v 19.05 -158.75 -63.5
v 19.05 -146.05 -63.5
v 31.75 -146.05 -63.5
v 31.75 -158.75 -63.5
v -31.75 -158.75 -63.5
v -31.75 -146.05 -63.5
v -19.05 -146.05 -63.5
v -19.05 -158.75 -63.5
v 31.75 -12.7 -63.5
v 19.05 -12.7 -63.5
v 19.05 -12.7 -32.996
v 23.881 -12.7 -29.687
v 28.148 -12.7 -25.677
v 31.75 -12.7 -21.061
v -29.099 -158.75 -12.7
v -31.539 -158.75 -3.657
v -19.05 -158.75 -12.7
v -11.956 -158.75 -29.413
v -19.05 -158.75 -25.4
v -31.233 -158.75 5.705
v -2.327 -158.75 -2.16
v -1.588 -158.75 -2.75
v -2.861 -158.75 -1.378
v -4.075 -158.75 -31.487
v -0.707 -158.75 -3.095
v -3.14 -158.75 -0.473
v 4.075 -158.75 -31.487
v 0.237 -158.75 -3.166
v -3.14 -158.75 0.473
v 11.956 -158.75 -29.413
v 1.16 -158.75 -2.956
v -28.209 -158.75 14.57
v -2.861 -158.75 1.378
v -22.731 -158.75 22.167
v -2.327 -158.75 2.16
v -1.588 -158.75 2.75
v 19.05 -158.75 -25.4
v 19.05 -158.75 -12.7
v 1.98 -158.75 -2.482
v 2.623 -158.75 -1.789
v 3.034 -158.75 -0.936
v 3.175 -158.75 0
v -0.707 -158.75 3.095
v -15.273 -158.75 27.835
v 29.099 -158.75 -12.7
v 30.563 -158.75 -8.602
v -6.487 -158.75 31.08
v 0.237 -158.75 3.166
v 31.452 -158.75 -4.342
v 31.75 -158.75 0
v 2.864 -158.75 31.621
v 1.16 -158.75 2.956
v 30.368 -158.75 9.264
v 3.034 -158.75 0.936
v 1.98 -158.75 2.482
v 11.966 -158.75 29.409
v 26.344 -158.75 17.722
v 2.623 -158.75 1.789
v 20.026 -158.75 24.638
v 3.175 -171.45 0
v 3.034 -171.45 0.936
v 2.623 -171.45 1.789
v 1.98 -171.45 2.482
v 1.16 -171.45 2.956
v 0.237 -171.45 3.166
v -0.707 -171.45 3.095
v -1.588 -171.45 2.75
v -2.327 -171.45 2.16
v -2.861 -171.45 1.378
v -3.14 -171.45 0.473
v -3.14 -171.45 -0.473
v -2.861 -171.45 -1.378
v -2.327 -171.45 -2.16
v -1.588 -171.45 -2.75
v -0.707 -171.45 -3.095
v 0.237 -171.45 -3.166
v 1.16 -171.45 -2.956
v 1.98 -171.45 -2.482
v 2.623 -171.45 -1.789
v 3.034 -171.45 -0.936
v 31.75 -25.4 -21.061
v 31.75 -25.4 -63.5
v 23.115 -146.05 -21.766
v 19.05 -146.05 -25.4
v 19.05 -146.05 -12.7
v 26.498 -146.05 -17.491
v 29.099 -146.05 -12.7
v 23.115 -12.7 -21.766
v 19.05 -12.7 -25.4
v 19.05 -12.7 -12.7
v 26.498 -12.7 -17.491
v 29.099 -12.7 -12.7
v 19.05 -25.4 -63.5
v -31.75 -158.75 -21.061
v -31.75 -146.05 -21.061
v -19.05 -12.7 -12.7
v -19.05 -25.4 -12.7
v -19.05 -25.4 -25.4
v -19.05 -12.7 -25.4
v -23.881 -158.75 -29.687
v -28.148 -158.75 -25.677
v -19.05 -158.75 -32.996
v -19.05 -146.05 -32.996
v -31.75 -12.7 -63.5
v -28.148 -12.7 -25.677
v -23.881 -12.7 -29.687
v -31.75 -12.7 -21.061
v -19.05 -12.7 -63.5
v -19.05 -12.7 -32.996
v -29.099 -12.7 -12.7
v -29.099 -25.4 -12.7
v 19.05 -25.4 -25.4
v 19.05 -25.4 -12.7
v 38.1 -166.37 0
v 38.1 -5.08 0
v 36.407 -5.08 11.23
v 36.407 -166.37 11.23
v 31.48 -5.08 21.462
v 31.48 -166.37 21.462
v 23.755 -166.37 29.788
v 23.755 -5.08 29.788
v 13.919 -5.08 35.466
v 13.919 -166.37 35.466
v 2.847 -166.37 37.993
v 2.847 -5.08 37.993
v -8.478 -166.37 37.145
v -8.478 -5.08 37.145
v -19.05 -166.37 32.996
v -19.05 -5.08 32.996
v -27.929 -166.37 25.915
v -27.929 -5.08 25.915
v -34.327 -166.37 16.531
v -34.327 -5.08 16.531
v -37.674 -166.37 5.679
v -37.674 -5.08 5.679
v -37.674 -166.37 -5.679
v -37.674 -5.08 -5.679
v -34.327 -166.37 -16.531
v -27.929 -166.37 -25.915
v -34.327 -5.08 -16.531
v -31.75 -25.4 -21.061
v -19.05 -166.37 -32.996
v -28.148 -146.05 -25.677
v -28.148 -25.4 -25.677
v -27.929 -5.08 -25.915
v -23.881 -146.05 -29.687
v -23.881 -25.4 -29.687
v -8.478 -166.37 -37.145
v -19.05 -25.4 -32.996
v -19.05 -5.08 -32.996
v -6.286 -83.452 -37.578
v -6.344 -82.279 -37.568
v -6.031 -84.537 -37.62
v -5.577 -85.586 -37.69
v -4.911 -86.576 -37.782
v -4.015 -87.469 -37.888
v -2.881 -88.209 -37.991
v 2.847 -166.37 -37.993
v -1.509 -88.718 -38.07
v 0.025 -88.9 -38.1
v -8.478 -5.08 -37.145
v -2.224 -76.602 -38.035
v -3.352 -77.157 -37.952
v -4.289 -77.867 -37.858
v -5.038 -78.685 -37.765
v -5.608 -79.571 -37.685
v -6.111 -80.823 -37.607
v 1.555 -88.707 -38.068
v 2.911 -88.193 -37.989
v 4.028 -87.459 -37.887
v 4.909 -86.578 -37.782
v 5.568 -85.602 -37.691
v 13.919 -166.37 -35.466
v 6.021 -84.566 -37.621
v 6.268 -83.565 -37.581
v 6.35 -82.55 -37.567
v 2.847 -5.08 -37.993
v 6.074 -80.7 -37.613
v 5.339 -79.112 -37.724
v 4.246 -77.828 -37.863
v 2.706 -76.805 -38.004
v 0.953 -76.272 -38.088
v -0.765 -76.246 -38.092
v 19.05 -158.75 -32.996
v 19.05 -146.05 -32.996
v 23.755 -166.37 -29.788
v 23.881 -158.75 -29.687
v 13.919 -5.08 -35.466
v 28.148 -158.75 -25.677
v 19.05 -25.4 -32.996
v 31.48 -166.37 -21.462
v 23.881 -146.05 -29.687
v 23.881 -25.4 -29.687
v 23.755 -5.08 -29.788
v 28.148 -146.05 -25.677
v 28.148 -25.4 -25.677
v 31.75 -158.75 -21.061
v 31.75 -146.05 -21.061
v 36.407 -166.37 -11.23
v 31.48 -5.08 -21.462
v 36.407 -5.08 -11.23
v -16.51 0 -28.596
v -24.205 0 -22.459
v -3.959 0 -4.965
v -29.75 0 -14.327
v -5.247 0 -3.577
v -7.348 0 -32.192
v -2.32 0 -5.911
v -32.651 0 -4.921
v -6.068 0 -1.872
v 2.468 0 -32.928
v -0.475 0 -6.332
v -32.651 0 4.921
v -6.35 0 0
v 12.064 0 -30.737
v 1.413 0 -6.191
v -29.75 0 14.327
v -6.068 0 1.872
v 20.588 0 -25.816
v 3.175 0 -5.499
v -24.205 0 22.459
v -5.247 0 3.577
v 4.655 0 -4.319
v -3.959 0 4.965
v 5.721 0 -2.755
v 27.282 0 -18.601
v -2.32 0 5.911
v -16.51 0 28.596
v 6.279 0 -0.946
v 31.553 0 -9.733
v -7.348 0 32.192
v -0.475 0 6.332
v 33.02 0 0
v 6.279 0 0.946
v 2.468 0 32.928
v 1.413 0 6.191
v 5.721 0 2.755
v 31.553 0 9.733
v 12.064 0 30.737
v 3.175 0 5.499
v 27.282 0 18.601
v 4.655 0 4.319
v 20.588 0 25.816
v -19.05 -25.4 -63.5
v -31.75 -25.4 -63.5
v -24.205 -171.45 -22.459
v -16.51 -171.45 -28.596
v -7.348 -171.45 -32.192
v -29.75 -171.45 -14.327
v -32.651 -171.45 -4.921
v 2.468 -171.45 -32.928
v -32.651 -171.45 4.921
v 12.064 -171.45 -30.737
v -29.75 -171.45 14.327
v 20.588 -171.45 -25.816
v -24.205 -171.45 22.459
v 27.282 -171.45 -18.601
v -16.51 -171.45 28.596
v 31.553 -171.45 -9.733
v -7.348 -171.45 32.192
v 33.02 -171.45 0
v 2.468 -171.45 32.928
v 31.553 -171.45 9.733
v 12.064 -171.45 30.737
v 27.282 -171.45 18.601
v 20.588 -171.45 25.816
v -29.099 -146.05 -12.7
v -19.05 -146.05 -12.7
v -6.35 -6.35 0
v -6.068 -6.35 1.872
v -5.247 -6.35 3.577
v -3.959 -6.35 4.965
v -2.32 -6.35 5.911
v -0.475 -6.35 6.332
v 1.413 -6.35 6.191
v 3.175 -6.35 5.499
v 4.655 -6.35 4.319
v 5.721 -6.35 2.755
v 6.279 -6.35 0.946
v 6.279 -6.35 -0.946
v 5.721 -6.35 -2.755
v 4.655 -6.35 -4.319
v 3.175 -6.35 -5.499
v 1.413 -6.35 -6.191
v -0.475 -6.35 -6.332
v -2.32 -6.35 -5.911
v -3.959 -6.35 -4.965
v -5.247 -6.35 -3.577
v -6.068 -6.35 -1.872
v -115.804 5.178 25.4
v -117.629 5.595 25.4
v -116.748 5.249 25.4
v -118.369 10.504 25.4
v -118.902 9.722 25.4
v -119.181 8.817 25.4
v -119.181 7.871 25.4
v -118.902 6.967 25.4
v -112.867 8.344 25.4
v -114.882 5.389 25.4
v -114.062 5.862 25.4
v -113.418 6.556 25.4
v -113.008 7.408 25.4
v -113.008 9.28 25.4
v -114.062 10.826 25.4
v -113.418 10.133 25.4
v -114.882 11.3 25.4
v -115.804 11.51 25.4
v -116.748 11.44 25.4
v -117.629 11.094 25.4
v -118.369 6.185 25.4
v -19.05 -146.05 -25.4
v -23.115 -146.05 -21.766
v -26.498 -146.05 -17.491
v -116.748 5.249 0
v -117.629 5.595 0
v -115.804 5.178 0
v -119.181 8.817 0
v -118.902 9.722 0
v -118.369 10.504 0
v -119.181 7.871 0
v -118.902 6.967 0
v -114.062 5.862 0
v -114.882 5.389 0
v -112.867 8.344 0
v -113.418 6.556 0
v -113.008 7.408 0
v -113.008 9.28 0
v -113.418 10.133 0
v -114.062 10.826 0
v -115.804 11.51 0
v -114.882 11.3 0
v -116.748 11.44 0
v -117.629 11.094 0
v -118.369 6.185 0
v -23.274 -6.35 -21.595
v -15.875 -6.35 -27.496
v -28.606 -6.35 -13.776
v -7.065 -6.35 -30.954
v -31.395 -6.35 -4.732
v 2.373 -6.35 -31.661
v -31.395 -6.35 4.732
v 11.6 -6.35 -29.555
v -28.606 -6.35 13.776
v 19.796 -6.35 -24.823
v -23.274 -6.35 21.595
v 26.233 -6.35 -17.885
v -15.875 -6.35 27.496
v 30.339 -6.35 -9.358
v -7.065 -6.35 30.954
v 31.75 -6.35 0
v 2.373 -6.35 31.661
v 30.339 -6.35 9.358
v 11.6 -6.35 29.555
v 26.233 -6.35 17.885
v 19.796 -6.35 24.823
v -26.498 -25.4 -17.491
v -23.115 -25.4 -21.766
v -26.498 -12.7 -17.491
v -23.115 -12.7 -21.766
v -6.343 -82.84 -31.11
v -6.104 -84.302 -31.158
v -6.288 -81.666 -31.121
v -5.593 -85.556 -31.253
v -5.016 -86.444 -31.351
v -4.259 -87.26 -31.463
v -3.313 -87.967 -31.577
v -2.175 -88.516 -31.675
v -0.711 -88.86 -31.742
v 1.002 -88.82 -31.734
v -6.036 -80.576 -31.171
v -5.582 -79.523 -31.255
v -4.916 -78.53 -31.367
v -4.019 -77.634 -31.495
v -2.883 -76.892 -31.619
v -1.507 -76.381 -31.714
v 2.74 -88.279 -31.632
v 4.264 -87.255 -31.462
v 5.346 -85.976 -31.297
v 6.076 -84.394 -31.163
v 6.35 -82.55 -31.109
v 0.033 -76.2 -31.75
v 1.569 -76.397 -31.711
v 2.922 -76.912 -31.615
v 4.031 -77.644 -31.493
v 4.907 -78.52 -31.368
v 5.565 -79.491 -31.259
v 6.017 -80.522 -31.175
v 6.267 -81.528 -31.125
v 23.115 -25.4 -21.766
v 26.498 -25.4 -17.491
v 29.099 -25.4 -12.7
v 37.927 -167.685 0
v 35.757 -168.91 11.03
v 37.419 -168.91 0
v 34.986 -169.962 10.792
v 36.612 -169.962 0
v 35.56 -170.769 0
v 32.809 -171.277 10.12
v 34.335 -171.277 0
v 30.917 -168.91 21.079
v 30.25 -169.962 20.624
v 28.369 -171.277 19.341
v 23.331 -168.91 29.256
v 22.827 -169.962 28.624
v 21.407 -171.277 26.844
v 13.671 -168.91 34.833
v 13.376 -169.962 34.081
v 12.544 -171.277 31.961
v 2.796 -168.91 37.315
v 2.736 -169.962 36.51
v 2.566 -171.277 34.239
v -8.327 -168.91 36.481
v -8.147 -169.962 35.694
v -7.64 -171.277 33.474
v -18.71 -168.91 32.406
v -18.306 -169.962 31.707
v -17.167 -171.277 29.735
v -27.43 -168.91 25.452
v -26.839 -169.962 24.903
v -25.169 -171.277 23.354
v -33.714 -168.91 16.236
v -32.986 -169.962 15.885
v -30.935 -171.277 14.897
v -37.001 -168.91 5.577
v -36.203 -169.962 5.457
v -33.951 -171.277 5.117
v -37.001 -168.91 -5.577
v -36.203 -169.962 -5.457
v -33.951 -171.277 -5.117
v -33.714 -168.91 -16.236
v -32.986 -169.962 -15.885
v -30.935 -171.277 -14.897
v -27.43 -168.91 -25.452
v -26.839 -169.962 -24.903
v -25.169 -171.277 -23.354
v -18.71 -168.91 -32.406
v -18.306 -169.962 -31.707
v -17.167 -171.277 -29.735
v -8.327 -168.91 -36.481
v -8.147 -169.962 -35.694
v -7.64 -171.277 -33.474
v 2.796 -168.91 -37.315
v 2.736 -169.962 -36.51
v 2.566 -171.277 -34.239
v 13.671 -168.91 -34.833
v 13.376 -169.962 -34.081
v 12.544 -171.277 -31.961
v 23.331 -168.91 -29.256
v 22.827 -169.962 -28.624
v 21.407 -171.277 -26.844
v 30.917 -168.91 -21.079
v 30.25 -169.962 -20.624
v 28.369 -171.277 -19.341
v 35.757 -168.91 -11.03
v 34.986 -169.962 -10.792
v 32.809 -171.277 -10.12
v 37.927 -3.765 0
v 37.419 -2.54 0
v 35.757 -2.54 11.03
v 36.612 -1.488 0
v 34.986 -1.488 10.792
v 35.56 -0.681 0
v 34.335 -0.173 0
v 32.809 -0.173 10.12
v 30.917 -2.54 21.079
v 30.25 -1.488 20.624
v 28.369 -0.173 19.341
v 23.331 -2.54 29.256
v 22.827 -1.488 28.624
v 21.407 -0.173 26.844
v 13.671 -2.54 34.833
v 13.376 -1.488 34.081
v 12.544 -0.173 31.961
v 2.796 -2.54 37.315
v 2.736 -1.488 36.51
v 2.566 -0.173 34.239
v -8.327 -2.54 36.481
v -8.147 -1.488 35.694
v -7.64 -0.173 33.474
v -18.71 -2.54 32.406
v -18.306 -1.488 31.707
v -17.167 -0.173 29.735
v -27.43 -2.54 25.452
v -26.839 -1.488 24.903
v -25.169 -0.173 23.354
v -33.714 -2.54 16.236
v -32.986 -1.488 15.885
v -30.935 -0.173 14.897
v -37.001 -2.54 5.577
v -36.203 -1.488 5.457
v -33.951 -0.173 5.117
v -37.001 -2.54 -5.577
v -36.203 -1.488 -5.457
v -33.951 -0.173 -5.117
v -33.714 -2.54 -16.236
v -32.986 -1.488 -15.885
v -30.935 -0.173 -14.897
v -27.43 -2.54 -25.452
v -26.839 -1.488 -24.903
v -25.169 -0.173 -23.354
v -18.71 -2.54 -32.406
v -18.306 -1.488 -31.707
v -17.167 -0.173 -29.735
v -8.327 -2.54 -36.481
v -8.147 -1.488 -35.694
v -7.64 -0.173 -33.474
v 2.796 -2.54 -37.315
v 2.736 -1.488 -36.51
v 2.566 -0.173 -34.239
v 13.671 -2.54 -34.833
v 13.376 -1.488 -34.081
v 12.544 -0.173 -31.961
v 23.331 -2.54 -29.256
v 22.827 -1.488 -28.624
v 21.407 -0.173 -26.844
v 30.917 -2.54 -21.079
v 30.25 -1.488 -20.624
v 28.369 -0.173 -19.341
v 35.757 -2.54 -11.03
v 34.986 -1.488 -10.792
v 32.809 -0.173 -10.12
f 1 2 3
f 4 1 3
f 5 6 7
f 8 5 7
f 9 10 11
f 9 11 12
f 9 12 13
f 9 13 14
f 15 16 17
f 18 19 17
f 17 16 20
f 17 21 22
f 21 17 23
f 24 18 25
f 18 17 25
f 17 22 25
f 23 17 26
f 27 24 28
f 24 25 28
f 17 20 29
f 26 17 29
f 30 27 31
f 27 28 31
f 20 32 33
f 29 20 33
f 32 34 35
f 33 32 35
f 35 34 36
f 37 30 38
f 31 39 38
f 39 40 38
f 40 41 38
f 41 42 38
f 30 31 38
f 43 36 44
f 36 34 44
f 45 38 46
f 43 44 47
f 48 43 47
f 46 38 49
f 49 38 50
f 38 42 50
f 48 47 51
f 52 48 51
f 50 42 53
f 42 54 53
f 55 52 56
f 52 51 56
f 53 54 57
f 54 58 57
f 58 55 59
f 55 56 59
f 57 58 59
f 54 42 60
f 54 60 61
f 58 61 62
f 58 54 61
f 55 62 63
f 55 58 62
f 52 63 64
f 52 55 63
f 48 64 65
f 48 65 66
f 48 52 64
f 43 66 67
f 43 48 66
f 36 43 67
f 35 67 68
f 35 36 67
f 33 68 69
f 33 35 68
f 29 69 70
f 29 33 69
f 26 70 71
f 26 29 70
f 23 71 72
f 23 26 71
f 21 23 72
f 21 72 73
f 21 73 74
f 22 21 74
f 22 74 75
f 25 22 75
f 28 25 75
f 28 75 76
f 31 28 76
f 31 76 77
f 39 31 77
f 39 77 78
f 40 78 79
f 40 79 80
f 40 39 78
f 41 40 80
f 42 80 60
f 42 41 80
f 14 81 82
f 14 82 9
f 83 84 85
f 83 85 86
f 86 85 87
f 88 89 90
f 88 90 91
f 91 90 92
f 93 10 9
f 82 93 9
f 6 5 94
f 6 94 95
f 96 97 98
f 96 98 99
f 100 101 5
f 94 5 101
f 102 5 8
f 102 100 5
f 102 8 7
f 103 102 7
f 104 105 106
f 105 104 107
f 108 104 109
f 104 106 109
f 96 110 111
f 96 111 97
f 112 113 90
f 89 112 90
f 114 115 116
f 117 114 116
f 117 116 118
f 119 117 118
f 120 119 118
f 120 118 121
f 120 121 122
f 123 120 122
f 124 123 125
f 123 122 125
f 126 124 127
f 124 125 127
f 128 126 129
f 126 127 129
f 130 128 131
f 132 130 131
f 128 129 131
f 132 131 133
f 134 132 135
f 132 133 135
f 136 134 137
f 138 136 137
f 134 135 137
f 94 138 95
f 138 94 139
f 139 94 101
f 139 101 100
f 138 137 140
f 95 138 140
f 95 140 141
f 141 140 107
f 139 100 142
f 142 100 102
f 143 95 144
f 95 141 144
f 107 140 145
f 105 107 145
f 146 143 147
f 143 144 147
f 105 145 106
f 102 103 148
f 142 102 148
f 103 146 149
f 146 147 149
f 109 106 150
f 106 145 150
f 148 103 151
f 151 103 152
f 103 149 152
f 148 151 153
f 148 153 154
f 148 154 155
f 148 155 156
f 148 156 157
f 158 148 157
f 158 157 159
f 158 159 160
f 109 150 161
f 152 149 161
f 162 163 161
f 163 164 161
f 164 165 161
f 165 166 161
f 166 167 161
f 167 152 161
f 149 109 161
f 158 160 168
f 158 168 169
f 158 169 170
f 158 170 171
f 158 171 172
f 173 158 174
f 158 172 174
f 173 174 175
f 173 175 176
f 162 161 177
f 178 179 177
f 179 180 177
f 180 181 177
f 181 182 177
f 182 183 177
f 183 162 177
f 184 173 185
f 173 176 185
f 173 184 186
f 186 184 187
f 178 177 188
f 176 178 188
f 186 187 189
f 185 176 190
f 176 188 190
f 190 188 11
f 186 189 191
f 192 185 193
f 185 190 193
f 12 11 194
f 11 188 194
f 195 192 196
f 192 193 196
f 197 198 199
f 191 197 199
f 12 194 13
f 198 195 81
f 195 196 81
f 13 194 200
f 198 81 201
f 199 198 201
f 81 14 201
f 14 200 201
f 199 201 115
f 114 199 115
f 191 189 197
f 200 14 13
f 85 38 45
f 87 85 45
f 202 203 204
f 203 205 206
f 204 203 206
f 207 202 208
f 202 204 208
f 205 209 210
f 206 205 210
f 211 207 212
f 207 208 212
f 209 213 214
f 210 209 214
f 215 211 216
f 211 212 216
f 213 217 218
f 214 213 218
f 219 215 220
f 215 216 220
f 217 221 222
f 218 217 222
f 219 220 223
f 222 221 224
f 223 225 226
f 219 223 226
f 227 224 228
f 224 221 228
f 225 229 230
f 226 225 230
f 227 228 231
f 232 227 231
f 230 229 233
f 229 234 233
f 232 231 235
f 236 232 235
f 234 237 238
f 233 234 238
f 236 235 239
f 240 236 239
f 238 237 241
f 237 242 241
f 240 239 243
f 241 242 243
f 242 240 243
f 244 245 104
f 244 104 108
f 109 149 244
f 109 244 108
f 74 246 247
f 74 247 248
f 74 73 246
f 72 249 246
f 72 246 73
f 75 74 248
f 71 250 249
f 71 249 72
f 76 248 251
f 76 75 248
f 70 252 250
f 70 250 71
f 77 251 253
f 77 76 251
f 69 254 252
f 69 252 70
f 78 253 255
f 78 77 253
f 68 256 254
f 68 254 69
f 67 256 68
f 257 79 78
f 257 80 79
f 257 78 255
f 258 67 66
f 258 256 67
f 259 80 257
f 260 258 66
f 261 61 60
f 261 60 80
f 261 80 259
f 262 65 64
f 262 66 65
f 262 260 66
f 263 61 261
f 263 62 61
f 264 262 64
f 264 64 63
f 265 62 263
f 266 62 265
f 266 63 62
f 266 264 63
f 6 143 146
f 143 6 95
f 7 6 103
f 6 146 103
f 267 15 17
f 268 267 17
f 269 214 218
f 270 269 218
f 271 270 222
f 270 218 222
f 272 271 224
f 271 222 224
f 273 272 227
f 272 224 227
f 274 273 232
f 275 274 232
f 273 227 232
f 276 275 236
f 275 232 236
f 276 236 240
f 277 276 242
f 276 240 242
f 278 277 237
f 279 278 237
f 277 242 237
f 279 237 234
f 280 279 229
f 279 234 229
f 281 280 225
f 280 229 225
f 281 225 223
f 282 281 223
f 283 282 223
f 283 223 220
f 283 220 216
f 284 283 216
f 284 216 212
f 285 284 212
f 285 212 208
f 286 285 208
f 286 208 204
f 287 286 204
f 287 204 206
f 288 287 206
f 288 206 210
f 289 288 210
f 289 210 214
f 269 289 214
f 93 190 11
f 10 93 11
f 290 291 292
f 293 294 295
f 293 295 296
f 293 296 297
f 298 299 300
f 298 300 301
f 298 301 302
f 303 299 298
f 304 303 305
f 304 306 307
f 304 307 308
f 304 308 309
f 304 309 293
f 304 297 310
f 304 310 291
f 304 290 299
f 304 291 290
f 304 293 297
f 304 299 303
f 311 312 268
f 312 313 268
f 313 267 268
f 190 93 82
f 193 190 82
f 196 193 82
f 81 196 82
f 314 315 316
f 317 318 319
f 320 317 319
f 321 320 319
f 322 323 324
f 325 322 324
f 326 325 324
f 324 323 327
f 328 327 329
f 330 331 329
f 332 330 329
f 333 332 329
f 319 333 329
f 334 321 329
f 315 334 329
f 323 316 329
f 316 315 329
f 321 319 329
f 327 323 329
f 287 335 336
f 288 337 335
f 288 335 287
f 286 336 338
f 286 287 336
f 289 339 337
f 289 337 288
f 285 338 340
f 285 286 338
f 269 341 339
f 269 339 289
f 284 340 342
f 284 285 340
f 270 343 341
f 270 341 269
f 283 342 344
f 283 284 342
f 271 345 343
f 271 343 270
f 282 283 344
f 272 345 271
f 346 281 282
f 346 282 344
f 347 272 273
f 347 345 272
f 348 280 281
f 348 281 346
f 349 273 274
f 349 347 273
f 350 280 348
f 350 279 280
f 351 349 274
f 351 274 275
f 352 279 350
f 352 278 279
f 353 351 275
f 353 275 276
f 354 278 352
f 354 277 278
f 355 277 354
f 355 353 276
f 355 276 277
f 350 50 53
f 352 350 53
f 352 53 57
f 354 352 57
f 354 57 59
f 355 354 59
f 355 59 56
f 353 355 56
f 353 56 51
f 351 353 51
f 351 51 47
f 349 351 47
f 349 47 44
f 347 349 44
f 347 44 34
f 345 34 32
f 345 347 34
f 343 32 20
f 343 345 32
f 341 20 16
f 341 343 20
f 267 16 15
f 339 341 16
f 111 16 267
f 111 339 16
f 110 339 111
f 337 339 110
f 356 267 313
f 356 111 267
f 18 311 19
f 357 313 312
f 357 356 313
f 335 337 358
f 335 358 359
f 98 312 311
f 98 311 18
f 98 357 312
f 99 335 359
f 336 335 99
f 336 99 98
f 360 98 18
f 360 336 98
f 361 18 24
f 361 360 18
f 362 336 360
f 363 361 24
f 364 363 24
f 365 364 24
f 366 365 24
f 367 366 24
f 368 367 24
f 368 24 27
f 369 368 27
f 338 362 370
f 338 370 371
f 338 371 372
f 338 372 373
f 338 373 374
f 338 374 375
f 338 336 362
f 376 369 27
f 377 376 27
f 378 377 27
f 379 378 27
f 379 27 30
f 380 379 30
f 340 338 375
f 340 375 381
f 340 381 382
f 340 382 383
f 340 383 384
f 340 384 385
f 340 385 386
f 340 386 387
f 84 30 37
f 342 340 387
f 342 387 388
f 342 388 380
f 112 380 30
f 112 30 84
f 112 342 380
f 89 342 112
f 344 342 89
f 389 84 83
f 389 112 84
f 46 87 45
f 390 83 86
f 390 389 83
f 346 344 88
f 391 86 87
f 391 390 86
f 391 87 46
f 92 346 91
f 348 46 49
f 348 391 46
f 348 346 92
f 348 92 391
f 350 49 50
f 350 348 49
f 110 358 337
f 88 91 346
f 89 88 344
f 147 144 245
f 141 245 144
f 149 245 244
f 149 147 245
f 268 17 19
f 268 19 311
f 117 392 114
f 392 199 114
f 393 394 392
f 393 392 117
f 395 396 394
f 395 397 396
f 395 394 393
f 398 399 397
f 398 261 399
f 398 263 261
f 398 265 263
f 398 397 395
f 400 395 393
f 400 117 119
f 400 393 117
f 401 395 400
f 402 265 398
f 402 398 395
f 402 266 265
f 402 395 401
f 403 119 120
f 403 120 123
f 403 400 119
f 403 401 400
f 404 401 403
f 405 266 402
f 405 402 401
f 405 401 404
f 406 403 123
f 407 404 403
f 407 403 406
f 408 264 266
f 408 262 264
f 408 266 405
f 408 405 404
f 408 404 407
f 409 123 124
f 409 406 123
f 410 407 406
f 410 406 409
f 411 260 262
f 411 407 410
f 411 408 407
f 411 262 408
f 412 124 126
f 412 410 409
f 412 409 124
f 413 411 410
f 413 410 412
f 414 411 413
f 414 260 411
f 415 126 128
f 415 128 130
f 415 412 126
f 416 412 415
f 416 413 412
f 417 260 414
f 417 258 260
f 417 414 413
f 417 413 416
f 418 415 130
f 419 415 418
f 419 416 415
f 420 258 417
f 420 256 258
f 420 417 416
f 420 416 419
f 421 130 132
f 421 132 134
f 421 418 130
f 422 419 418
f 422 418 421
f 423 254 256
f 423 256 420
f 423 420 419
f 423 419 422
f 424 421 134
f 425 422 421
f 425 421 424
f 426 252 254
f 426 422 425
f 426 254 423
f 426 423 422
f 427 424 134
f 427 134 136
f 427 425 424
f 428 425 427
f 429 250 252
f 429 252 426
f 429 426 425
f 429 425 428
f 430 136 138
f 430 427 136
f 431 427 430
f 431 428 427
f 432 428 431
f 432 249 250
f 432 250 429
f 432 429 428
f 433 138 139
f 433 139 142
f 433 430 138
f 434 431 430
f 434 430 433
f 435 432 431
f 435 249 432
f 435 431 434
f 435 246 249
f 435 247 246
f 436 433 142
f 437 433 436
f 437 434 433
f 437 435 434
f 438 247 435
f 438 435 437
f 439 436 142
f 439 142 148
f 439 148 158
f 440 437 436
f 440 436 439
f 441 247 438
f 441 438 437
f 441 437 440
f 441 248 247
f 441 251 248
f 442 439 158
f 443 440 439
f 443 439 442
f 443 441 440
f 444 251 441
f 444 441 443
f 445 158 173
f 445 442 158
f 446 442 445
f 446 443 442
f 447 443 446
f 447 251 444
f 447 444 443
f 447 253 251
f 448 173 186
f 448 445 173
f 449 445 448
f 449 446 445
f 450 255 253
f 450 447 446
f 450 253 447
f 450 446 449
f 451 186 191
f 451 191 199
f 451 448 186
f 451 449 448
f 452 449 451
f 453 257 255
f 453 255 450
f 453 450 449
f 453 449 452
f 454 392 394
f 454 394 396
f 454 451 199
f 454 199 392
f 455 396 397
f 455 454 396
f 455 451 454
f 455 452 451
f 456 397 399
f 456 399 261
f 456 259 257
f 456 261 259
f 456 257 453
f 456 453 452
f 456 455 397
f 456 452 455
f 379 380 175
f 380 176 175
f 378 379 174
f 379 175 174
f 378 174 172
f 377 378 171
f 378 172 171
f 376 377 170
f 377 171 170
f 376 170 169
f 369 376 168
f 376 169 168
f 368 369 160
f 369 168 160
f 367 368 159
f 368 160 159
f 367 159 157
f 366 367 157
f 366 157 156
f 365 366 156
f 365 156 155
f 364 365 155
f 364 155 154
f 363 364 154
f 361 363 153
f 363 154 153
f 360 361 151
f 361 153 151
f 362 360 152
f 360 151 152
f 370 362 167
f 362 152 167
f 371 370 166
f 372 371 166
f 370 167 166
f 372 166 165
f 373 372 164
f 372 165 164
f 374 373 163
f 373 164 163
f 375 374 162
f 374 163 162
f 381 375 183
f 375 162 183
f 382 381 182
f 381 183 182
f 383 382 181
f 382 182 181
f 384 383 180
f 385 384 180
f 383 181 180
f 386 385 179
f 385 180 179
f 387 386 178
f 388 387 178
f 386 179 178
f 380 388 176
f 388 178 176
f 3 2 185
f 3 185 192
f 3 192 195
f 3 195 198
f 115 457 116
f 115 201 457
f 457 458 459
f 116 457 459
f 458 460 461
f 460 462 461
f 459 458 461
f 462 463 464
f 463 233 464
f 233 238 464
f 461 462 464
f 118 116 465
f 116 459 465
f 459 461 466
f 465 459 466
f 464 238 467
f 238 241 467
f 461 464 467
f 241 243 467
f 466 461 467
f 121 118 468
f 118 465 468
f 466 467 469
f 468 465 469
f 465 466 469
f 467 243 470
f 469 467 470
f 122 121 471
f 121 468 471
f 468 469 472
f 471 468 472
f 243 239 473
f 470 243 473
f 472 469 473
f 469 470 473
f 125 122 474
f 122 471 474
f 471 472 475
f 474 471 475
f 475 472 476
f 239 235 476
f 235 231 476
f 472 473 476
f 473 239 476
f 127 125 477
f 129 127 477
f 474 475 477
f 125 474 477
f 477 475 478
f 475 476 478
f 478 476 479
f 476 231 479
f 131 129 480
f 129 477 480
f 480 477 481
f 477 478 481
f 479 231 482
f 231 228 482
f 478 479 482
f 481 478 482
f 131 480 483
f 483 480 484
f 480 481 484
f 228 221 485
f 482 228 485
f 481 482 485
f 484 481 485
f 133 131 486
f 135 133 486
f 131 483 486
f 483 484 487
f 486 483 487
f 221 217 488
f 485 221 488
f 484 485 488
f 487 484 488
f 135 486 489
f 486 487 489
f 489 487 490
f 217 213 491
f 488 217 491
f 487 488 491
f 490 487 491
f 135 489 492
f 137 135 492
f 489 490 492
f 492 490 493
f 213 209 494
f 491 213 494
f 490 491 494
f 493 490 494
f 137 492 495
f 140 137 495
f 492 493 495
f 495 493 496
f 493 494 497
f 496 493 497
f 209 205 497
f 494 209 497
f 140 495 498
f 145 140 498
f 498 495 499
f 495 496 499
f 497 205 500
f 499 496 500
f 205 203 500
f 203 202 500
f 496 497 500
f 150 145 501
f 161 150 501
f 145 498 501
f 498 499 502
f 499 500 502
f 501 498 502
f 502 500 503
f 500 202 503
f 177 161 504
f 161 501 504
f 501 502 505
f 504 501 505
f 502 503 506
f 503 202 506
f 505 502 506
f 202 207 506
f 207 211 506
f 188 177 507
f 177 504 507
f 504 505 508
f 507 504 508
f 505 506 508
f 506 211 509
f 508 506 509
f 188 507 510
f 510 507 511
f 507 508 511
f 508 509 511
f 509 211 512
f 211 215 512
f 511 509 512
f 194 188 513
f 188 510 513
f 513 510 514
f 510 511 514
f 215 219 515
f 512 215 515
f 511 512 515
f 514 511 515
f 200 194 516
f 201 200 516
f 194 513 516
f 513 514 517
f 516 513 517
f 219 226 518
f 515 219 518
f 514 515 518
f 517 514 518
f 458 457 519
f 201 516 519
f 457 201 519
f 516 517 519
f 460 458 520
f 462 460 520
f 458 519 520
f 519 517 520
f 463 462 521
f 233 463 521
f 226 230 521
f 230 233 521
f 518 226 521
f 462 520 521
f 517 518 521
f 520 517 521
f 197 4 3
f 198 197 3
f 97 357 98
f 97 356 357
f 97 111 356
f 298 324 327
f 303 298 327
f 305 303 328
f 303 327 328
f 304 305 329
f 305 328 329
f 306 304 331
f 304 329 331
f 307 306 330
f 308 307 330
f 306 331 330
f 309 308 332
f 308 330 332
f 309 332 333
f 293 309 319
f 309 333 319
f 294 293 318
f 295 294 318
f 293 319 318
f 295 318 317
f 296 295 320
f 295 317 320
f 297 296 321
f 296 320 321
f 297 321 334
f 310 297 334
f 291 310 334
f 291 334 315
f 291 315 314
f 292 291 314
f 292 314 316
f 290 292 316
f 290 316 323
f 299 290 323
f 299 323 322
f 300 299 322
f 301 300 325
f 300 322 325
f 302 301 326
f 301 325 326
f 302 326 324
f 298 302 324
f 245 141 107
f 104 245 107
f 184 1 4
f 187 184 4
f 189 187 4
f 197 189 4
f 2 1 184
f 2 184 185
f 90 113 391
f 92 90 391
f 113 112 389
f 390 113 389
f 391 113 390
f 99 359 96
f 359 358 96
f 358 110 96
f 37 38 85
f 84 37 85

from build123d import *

# Parameters (mm, degrees)
F0_R      = 38.1
F1_DEPTH  = 6.35
F2_R      = 38.1
F2_R_2    = 31.75
F3_DEPTH  = 152.4
F4_R      = 38.1
F4_R_2    = 3.175
F5_DEPTH  = 12.7
F6_R      = 6.35
F7_DEPTH  = 25.4
F8_R      = 5.08
F10_W     = 12.7
F10_H     = 12.7
F10_W_2   = 12.6999954973
F10_R     = 6.35
F11_DEPTH = 25.4
F12_DEPTH = 25.4
F13_DEPTH = 25.4
F15_DEPTH = 25.4
F16_R     = 6.35
F17_DEPTH = 25.4
F18_R     = 3.175
F19_DEPTH = 25.4


with BuildPart() as f1:
    # F0 (on Front) → F1 (new body)
    with BuildSketch(Plane.XZ):
        Circle(F0_R)
    extrude(amount=F1_DEPTH)

    # F2 (on face) → F3 (join)
    with BuildSketch(Plane.XZ.offset(6.35)):
        Circle(F2_R)
        Circle(F2_R_2, mode=Mode.SUBTRACT)
    extrude(amount=F3_DEPTH)

    # F4 (on face) → F5 (join)
    with BuildSketch(Plane.XZ.offset(158.75)):
        Circle(F4_R)
        Circle(F4_R_2, mode=Mode.SUBTRACT)
    extrude(amount=F5_DEPTH)

    # F6 (on face) → F7 (cut)
    with BuildSketch(Plane(origin=(0, 0, 0), x_dir=(-1, 0, 0), z_dir=(0, 1, 0))):
        Circle(F6_R)
    extrude(amount=-F7_DEPTH, mode=Mode.SUBTRACT)

    # F8
    f8_edges = [f1.edges().sort_by_distance(p)[0] for p in [
        (-38.1, 0, 0),
        (-38.1, -171.45, 0),
    ]]
    fillet(f8_edges, radius=F8_R)

    # F10 (on offset) → F11 (join)
    with BuildSketch(Plane.XY.offset(-12.7)):
        with Locations((-25.4, -152.4)):
            Rectangle(F10_W, F10_H)
        with Locations((25.4, -152.4)):
            Rectangle(F10_W, F10_H)
        with Locations((-25.4000022513, -19.05)):
            Rectangle(F10_W_2, F10_H)
        with Locations((25.3999954973, -19.05)):
            Rectangle(F10_W, F10_H)
        with Locations((0, -82.55)):
            Circle(F10_R)
    extrude(amount=-F11_DEPTH)

    # F12 (add): faces of the model
    f12_faces = [f1.faces().sort_by_distance(p)[0] for p in [
        (-25.4, -152.4, -38.1),
        (-25.4000022513, -19.05, -38.1),
        (25.3999954973, -19.05, -38.1),
        (25.4, -152.4, -38.1),
    ]]
    extrude(f12_faces, amount=F12_DEPTH)

    # F13 (add): a face of the model
    f13_faces = [f1.faces().sort_by_distance(p)[0] for p in [
        (0, -82.55, -38.1),
    ]]
    extrude(f13_faces, amount=-F13_DEPTH)

    # F14 (on face) → F15 (join)
    with BuildSketch(Plane(origin=(0, 0, -38.1), x_dir=(1, 0, 0), z_dir=(0, 0, -1))):
        with BuildLine():
            ThreePointArc((-6.743e-07, 88.9), (-6.35, 82.5499993257), (6.743e-07, 76.2))
            ThreePointArc((6.743e-07, 76.2), (6.35, 82.5500006743), (-6.743e-07, 88.9))
        make_face()
    extrude(amount=-F15_DEPTH)

    # F16 (on face) → F17 (cut)
    with BuildSketch(Plane(origin=(0, 0, -38.1), x_dir=(1, 0, 0), z_dir=(0, 0, -1))):
        with Locations((0, 82.55)):
            Circle(F16_R)
    extrude(amount=-F17_DEPTH, mode=Mode.SUBTRACT)


with BuildPart() as f19:
    # F18 (on Top) → F19 (new body)
    with BuildSketch(Plane.XY):
        with Locations((-116.0415932536, 8.3441408351)):
            Circle(F18_R)
    extrude(amount=F19_DEPTH)


solid = Compound([f1.part, f19.part])
